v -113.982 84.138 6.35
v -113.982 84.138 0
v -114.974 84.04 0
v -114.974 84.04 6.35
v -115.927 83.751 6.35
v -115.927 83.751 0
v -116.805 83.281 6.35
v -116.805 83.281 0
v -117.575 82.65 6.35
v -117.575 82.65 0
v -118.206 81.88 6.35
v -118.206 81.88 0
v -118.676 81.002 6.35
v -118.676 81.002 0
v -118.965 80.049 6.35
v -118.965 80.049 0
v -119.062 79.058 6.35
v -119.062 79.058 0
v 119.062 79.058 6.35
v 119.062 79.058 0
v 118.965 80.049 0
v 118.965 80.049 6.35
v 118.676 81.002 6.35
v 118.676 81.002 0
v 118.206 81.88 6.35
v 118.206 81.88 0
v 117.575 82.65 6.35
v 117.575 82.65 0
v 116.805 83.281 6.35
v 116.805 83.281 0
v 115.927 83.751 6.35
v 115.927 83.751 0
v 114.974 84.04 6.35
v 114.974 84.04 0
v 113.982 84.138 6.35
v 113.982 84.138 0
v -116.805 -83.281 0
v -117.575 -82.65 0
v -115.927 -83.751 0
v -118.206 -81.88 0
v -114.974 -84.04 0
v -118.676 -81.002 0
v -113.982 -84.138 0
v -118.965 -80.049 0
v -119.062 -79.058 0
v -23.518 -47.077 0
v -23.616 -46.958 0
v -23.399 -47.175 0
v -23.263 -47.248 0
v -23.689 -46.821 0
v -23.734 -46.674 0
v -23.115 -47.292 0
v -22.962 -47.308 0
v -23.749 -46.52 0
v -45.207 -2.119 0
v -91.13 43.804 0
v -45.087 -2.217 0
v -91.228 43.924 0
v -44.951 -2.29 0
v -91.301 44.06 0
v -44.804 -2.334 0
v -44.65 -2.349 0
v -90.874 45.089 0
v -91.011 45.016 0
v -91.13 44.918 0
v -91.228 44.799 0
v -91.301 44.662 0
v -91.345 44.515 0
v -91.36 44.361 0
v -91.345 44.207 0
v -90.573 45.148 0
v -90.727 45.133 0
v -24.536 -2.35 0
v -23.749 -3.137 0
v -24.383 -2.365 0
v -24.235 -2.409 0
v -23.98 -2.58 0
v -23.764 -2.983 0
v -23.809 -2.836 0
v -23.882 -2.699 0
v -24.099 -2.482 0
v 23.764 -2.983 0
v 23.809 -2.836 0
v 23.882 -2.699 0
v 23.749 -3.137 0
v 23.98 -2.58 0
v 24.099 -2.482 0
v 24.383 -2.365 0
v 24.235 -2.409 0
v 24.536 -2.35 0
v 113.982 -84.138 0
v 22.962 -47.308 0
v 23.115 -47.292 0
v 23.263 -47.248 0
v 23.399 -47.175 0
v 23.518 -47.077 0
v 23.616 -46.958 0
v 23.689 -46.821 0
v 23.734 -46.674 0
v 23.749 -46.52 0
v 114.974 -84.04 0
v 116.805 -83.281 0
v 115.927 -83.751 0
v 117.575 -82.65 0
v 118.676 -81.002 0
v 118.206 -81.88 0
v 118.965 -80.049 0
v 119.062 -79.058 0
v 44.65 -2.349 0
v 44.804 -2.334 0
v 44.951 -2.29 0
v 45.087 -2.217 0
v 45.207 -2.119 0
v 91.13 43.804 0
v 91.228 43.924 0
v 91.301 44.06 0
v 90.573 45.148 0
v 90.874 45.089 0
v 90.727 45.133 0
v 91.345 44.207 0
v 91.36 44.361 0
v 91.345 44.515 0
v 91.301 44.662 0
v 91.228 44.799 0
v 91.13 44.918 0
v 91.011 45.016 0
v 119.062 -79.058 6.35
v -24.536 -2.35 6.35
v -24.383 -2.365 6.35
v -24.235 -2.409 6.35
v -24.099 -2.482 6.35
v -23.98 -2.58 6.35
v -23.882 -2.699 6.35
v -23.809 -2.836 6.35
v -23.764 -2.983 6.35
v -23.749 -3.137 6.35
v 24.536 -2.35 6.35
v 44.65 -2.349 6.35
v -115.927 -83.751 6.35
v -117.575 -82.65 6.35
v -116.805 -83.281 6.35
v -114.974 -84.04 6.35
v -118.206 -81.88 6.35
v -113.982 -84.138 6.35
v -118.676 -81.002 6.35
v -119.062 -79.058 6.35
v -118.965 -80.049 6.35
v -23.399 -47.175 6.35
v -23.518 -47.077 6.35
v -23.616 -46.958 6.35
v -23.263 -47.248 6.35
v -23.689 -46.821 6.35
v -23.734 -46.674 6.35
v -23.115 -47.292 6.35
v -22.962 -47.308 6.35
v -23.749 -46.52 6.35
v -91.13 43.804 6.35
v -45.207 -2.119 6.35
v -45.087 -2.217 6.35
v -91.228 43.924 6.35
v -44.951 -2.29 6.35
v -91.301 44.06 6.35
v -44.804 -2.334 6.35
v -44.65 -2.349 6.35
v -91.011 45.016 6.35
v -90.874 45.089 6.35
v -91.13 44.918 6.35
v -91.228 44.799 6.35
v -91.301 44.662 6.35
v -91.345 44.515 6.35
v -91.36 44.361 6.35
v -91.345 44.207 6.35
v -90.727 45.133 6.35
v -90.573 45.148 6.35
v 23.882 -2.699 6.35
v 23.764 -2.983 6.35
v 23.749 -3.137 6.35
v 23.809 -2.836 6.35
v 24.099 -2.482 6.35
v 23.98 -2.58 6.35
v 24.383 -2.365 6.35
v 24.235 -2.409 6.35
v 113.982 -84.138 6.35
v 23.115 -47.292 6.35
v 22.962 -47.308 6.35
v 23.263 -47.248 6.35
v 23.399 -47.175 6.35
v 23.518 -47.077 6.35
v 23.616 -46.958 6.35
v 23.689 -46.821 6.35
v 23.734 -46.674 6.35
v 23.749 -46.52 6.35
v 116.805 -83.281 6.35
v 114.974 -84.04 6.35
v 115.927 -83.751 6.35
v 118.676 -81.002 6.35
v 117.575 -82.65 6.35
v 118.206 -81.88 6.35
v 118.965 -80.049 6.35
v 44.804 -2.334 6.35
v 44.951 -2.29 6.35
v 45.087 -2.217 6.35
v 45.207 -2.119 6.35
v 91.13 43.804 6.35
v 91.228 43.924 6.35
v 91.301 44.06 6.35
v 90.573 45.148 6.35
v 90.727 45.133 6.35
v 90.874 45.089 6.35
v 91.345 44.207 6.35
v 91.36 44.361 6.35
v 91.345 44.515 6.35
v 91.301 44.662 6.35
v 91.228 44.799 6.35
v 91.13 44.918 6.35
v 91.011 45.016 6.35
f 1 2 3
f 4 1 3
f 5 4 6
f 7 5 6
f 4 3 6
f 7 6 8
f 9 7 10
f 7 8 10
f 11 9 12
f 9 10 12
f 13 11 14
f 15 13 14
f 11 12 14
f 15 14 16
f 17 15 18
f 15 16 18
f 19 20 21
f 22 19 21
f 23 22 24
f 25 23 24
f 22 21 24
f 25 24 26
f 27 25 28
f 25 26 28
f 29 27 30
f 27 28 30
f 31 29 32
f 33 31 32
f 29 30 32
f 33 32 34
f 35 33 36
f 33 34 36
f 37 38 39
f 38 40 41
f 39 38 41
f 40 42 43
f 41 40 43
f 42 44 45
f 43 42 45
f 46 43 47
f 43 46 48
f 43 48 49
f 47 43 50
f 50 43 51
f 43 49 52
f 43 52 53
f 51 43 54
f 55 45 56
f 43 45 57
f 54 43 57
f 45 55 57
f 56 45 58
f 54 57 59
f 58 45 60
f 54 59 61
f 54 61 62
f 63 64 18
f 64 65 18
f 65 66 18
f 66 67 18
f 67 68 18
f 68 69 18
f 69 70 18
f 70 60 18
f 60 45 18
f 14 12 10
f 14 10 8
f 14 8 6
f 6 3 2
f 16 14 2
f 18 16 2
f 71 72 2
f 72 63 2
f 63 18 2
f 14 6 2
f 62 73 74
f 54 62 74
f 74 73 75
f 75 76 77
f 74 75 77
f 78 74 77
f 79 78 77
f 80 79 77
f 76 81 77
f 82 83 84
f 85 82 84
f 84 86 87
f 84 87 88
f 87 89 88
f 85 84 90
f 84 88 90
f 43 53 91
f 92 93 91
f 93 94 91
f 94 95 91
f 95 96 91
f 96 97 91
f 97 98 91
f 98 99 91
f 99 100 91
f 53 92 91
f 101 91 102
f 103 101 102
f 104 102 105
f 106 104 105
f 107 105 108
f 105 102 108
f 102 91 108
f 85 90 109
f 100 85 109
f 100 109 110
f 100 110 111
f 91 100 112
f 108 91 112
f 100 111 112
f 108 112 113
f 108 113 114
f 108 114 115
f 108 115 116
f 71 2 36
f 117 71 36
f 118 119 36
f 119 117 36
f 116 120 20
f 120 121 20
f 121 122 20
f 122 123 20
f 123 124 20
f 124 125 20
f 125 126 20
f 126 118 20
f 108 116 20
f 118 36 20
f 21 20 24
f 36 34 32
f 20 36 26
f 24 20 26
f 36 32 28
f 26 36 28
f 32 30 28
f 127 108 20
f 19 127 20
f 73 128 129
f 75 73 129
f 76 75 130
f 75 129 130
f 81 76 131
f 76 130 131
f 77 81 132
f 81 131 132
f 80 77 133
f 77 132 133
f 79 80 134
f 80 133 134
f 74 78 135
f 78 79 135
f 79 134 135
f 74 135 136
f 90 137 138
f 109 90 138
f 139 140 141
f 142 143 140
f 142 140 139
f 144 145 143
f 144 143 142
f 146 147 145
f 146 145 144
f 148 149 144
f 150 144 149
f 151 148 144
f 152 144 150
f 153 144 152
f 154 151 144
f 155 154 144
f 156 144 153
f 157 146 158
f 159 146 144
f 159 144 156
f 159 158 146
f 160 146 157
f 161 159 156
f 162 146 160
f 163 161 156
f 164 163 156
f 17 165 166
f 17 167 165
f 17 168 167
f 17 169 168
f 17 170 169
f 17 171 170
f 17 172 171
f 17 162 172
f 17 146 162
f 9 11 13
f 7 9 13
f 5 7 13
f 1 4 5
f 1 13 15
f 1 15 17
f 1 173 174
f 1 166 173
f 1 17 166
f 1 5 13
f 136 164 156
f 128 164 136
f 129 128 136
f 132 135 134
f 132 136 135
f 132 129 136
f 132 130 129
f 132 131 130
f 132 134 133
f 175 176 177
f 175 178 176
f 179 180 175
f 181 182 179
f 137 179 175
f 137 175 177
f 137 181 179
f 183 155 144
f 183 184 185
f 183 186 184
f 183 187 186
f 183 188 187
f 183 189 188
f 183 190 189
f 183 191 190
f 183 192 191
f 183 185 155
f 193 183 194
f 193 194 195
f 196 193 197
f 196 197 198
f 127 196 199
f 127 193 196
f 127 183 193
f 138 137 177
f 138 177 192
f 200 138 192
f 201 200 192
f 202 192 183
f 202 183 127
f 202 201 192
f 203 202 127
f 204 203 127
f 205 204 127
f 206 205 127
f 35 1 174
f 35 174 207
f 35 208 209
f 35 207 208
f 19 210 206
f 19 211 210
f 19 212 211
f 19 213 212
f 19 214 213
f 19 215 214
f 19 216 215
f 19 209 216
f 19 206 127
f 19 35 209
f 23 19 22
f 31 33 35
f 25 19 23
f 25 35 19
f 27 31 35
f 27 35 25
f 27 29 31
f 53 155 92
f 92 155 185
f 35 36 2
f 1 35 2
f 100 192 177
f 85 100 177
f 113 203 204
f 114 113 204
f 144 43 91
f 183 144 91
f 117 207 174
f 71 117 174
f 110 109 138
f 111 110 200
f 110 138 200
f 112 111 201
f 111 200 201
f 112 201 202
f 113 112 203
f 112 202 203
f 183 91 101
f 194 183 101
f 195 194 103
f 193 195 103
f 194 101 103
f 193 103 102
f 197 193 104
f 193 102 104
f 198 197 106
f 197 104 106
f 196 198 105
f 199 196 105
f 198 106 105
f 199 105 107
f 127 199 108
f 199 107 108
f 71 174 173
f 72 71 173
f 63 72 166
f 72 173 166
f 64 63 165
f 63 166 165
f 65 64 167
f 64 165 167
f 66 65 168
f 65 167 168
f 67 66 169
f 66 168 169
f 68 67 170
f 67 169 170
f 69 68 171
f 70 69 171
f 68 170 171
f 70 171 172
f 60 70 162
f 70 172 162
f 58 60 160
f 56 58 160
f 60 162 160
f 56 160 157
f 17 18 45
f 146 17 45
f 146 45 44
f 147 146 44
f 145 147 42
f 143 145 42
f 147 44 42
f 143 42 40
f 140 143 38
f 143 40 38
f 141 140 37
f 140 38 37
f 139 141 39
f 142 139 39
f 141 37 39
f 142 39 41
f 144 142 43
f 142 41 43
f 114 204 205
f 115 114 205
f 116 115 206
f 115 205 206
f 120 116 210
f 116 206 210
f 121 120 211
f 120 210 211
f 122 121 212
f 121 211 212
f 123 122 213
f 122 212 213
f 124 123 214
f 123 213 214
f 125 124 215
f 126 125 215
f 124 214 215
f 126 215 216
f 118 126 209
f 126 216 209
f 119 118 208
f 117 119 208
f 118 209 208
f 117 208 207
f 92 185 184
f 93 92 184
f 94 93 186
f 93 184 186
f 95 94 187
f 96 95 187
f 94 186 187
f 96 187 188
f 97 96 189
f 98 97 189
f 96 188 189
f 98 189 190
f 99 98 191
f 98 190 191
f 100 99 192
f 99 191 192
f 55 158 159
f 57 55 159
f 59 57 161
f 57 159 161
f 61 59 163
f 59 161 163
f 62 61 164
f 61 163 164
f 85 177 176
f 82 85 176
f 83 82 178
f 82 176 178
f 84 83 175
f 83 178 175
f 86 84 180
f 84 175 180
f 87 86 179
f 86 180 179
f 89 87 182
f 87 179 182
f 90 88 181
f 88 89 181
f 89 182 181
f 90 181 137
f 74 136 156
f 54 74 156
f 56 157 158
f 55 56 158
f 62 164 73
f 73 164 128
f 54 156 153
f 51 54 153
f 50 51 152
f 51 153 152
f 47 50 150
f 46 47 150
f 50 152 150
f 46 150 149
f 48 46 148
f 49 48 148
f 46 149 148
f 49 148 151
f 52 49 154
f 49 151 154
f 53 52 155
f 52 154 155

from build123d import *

# Parameters (mm, degrees)
F1_DEPTH = 6.35
F3_DEPTH = 25.4
F5_DEPTH = 25.4


with BuildPart() as f1:
    # F0 (on Top) → F1 (new body)
    with BuildSketch(Plane.XY):
        with BuildLine():
            Line((113.9825, 84.1375), (-113.9825, 84.1375))
            ThreePointArc((-113.9825, 84.1375), (-117.574602, 82.649602), (-119.0625, 79.0575))
            Line((-119.0625, 79.0575), (-119.0625, -79.0575))
            ThreePointArc((-119.0625, -79.0575), (-117.574602, -82.649602), (-113.9825, -84.1375))
            Line((-113.9825, -84.1375), (113.9825, -84.1375))
            ThreePointArc((113.9825, -84.1375), (117.574602, -82.649602), (119.0625, -79.0575))
            Line((119.0625, -79.0575), (119.0625, 79.0575))
            ThreePointArc((119.0625, 79.0575), (117.574602, 82.649602), (113.9825, 84.1375))
        make_face()
    extrude(amount=F1_DEPTH)

    # F2 (on face) → F3 (cut)
    with BuildSketch(Plane.XY.offset(6.35)):
        Polygon((89.408, 43.8785), (0, 43.8785), (-89.408, 43.8785), (-44.45, -1.0795), (-22.479, -1.0795), (-22.479, -46.0375), (0, -46.0375), (22.479, -46.0375), (22.479, -1.0795), (44.45, -1.0795), align=None)
    extrude(amount=-F3_DEPTH, mode=Mode.SUBTRACT)

    # F4 (on face) → F5 (cut)
    with BuildSketch(Plane.XY.offset(6.35)):
        with BuildLine():
            ThreePointArc((-90.573099, 45.1485), (-91.300562, 44.662425), (-91.129875, 43.804324))
            Line((-91.129875, 43.804324), (-45.206675, -2.118876))
            ThreePointArc((-45.206675, -2.118876), (-44.951224, -2.289563), (-44.649899, -2.3495))
            Line((-44.649899, -2.3495), (-24.5364, -2.3495))
            ThreePointArc((-24.5364, -2.3495), (-23.979624, -2.580124), (-23.749, -3.1369))
            Line((-23.749, -3.1369), (-23.749, -46.5201))
            ThreePointArc((-23.749, -46.5201), (-23.518376, -47.076876), (-22.9616, -47.3075))
            Line((-22.9616, -47.3075), (22.9616, -47.3075))
            ThreePointArc((22.9616, -47.3075), (23.518376, -47.076876), (23.749, -46.5201))
            Line((23.749, -46.5201), (23.749, -3.1369))
            ThreePointArc((23.749, -3.1369), (23.979624, -2.580124), (24.5364, -2.3495))
            Line((24.5364, -2.3495), (44.649899, -2.3495))
            ThreePointArc((44.649899, -2.3495), (44.951224, -2.289563), (45.206675, -2.118876))
            Line((45.206675, -2.118876), (91.129875, 43.804324))
            ThreePointArc((91.129875, 43.804324), (91.300562, 44.662425), (90.573099, 45.1485))
            Line((90.573099, 45.1485), (-90.573099, 45.1485))
        make_face()
    extrude(amount=-F5_DEPTH, mode=Mode.SUBTRACT)


solid = f1.part
